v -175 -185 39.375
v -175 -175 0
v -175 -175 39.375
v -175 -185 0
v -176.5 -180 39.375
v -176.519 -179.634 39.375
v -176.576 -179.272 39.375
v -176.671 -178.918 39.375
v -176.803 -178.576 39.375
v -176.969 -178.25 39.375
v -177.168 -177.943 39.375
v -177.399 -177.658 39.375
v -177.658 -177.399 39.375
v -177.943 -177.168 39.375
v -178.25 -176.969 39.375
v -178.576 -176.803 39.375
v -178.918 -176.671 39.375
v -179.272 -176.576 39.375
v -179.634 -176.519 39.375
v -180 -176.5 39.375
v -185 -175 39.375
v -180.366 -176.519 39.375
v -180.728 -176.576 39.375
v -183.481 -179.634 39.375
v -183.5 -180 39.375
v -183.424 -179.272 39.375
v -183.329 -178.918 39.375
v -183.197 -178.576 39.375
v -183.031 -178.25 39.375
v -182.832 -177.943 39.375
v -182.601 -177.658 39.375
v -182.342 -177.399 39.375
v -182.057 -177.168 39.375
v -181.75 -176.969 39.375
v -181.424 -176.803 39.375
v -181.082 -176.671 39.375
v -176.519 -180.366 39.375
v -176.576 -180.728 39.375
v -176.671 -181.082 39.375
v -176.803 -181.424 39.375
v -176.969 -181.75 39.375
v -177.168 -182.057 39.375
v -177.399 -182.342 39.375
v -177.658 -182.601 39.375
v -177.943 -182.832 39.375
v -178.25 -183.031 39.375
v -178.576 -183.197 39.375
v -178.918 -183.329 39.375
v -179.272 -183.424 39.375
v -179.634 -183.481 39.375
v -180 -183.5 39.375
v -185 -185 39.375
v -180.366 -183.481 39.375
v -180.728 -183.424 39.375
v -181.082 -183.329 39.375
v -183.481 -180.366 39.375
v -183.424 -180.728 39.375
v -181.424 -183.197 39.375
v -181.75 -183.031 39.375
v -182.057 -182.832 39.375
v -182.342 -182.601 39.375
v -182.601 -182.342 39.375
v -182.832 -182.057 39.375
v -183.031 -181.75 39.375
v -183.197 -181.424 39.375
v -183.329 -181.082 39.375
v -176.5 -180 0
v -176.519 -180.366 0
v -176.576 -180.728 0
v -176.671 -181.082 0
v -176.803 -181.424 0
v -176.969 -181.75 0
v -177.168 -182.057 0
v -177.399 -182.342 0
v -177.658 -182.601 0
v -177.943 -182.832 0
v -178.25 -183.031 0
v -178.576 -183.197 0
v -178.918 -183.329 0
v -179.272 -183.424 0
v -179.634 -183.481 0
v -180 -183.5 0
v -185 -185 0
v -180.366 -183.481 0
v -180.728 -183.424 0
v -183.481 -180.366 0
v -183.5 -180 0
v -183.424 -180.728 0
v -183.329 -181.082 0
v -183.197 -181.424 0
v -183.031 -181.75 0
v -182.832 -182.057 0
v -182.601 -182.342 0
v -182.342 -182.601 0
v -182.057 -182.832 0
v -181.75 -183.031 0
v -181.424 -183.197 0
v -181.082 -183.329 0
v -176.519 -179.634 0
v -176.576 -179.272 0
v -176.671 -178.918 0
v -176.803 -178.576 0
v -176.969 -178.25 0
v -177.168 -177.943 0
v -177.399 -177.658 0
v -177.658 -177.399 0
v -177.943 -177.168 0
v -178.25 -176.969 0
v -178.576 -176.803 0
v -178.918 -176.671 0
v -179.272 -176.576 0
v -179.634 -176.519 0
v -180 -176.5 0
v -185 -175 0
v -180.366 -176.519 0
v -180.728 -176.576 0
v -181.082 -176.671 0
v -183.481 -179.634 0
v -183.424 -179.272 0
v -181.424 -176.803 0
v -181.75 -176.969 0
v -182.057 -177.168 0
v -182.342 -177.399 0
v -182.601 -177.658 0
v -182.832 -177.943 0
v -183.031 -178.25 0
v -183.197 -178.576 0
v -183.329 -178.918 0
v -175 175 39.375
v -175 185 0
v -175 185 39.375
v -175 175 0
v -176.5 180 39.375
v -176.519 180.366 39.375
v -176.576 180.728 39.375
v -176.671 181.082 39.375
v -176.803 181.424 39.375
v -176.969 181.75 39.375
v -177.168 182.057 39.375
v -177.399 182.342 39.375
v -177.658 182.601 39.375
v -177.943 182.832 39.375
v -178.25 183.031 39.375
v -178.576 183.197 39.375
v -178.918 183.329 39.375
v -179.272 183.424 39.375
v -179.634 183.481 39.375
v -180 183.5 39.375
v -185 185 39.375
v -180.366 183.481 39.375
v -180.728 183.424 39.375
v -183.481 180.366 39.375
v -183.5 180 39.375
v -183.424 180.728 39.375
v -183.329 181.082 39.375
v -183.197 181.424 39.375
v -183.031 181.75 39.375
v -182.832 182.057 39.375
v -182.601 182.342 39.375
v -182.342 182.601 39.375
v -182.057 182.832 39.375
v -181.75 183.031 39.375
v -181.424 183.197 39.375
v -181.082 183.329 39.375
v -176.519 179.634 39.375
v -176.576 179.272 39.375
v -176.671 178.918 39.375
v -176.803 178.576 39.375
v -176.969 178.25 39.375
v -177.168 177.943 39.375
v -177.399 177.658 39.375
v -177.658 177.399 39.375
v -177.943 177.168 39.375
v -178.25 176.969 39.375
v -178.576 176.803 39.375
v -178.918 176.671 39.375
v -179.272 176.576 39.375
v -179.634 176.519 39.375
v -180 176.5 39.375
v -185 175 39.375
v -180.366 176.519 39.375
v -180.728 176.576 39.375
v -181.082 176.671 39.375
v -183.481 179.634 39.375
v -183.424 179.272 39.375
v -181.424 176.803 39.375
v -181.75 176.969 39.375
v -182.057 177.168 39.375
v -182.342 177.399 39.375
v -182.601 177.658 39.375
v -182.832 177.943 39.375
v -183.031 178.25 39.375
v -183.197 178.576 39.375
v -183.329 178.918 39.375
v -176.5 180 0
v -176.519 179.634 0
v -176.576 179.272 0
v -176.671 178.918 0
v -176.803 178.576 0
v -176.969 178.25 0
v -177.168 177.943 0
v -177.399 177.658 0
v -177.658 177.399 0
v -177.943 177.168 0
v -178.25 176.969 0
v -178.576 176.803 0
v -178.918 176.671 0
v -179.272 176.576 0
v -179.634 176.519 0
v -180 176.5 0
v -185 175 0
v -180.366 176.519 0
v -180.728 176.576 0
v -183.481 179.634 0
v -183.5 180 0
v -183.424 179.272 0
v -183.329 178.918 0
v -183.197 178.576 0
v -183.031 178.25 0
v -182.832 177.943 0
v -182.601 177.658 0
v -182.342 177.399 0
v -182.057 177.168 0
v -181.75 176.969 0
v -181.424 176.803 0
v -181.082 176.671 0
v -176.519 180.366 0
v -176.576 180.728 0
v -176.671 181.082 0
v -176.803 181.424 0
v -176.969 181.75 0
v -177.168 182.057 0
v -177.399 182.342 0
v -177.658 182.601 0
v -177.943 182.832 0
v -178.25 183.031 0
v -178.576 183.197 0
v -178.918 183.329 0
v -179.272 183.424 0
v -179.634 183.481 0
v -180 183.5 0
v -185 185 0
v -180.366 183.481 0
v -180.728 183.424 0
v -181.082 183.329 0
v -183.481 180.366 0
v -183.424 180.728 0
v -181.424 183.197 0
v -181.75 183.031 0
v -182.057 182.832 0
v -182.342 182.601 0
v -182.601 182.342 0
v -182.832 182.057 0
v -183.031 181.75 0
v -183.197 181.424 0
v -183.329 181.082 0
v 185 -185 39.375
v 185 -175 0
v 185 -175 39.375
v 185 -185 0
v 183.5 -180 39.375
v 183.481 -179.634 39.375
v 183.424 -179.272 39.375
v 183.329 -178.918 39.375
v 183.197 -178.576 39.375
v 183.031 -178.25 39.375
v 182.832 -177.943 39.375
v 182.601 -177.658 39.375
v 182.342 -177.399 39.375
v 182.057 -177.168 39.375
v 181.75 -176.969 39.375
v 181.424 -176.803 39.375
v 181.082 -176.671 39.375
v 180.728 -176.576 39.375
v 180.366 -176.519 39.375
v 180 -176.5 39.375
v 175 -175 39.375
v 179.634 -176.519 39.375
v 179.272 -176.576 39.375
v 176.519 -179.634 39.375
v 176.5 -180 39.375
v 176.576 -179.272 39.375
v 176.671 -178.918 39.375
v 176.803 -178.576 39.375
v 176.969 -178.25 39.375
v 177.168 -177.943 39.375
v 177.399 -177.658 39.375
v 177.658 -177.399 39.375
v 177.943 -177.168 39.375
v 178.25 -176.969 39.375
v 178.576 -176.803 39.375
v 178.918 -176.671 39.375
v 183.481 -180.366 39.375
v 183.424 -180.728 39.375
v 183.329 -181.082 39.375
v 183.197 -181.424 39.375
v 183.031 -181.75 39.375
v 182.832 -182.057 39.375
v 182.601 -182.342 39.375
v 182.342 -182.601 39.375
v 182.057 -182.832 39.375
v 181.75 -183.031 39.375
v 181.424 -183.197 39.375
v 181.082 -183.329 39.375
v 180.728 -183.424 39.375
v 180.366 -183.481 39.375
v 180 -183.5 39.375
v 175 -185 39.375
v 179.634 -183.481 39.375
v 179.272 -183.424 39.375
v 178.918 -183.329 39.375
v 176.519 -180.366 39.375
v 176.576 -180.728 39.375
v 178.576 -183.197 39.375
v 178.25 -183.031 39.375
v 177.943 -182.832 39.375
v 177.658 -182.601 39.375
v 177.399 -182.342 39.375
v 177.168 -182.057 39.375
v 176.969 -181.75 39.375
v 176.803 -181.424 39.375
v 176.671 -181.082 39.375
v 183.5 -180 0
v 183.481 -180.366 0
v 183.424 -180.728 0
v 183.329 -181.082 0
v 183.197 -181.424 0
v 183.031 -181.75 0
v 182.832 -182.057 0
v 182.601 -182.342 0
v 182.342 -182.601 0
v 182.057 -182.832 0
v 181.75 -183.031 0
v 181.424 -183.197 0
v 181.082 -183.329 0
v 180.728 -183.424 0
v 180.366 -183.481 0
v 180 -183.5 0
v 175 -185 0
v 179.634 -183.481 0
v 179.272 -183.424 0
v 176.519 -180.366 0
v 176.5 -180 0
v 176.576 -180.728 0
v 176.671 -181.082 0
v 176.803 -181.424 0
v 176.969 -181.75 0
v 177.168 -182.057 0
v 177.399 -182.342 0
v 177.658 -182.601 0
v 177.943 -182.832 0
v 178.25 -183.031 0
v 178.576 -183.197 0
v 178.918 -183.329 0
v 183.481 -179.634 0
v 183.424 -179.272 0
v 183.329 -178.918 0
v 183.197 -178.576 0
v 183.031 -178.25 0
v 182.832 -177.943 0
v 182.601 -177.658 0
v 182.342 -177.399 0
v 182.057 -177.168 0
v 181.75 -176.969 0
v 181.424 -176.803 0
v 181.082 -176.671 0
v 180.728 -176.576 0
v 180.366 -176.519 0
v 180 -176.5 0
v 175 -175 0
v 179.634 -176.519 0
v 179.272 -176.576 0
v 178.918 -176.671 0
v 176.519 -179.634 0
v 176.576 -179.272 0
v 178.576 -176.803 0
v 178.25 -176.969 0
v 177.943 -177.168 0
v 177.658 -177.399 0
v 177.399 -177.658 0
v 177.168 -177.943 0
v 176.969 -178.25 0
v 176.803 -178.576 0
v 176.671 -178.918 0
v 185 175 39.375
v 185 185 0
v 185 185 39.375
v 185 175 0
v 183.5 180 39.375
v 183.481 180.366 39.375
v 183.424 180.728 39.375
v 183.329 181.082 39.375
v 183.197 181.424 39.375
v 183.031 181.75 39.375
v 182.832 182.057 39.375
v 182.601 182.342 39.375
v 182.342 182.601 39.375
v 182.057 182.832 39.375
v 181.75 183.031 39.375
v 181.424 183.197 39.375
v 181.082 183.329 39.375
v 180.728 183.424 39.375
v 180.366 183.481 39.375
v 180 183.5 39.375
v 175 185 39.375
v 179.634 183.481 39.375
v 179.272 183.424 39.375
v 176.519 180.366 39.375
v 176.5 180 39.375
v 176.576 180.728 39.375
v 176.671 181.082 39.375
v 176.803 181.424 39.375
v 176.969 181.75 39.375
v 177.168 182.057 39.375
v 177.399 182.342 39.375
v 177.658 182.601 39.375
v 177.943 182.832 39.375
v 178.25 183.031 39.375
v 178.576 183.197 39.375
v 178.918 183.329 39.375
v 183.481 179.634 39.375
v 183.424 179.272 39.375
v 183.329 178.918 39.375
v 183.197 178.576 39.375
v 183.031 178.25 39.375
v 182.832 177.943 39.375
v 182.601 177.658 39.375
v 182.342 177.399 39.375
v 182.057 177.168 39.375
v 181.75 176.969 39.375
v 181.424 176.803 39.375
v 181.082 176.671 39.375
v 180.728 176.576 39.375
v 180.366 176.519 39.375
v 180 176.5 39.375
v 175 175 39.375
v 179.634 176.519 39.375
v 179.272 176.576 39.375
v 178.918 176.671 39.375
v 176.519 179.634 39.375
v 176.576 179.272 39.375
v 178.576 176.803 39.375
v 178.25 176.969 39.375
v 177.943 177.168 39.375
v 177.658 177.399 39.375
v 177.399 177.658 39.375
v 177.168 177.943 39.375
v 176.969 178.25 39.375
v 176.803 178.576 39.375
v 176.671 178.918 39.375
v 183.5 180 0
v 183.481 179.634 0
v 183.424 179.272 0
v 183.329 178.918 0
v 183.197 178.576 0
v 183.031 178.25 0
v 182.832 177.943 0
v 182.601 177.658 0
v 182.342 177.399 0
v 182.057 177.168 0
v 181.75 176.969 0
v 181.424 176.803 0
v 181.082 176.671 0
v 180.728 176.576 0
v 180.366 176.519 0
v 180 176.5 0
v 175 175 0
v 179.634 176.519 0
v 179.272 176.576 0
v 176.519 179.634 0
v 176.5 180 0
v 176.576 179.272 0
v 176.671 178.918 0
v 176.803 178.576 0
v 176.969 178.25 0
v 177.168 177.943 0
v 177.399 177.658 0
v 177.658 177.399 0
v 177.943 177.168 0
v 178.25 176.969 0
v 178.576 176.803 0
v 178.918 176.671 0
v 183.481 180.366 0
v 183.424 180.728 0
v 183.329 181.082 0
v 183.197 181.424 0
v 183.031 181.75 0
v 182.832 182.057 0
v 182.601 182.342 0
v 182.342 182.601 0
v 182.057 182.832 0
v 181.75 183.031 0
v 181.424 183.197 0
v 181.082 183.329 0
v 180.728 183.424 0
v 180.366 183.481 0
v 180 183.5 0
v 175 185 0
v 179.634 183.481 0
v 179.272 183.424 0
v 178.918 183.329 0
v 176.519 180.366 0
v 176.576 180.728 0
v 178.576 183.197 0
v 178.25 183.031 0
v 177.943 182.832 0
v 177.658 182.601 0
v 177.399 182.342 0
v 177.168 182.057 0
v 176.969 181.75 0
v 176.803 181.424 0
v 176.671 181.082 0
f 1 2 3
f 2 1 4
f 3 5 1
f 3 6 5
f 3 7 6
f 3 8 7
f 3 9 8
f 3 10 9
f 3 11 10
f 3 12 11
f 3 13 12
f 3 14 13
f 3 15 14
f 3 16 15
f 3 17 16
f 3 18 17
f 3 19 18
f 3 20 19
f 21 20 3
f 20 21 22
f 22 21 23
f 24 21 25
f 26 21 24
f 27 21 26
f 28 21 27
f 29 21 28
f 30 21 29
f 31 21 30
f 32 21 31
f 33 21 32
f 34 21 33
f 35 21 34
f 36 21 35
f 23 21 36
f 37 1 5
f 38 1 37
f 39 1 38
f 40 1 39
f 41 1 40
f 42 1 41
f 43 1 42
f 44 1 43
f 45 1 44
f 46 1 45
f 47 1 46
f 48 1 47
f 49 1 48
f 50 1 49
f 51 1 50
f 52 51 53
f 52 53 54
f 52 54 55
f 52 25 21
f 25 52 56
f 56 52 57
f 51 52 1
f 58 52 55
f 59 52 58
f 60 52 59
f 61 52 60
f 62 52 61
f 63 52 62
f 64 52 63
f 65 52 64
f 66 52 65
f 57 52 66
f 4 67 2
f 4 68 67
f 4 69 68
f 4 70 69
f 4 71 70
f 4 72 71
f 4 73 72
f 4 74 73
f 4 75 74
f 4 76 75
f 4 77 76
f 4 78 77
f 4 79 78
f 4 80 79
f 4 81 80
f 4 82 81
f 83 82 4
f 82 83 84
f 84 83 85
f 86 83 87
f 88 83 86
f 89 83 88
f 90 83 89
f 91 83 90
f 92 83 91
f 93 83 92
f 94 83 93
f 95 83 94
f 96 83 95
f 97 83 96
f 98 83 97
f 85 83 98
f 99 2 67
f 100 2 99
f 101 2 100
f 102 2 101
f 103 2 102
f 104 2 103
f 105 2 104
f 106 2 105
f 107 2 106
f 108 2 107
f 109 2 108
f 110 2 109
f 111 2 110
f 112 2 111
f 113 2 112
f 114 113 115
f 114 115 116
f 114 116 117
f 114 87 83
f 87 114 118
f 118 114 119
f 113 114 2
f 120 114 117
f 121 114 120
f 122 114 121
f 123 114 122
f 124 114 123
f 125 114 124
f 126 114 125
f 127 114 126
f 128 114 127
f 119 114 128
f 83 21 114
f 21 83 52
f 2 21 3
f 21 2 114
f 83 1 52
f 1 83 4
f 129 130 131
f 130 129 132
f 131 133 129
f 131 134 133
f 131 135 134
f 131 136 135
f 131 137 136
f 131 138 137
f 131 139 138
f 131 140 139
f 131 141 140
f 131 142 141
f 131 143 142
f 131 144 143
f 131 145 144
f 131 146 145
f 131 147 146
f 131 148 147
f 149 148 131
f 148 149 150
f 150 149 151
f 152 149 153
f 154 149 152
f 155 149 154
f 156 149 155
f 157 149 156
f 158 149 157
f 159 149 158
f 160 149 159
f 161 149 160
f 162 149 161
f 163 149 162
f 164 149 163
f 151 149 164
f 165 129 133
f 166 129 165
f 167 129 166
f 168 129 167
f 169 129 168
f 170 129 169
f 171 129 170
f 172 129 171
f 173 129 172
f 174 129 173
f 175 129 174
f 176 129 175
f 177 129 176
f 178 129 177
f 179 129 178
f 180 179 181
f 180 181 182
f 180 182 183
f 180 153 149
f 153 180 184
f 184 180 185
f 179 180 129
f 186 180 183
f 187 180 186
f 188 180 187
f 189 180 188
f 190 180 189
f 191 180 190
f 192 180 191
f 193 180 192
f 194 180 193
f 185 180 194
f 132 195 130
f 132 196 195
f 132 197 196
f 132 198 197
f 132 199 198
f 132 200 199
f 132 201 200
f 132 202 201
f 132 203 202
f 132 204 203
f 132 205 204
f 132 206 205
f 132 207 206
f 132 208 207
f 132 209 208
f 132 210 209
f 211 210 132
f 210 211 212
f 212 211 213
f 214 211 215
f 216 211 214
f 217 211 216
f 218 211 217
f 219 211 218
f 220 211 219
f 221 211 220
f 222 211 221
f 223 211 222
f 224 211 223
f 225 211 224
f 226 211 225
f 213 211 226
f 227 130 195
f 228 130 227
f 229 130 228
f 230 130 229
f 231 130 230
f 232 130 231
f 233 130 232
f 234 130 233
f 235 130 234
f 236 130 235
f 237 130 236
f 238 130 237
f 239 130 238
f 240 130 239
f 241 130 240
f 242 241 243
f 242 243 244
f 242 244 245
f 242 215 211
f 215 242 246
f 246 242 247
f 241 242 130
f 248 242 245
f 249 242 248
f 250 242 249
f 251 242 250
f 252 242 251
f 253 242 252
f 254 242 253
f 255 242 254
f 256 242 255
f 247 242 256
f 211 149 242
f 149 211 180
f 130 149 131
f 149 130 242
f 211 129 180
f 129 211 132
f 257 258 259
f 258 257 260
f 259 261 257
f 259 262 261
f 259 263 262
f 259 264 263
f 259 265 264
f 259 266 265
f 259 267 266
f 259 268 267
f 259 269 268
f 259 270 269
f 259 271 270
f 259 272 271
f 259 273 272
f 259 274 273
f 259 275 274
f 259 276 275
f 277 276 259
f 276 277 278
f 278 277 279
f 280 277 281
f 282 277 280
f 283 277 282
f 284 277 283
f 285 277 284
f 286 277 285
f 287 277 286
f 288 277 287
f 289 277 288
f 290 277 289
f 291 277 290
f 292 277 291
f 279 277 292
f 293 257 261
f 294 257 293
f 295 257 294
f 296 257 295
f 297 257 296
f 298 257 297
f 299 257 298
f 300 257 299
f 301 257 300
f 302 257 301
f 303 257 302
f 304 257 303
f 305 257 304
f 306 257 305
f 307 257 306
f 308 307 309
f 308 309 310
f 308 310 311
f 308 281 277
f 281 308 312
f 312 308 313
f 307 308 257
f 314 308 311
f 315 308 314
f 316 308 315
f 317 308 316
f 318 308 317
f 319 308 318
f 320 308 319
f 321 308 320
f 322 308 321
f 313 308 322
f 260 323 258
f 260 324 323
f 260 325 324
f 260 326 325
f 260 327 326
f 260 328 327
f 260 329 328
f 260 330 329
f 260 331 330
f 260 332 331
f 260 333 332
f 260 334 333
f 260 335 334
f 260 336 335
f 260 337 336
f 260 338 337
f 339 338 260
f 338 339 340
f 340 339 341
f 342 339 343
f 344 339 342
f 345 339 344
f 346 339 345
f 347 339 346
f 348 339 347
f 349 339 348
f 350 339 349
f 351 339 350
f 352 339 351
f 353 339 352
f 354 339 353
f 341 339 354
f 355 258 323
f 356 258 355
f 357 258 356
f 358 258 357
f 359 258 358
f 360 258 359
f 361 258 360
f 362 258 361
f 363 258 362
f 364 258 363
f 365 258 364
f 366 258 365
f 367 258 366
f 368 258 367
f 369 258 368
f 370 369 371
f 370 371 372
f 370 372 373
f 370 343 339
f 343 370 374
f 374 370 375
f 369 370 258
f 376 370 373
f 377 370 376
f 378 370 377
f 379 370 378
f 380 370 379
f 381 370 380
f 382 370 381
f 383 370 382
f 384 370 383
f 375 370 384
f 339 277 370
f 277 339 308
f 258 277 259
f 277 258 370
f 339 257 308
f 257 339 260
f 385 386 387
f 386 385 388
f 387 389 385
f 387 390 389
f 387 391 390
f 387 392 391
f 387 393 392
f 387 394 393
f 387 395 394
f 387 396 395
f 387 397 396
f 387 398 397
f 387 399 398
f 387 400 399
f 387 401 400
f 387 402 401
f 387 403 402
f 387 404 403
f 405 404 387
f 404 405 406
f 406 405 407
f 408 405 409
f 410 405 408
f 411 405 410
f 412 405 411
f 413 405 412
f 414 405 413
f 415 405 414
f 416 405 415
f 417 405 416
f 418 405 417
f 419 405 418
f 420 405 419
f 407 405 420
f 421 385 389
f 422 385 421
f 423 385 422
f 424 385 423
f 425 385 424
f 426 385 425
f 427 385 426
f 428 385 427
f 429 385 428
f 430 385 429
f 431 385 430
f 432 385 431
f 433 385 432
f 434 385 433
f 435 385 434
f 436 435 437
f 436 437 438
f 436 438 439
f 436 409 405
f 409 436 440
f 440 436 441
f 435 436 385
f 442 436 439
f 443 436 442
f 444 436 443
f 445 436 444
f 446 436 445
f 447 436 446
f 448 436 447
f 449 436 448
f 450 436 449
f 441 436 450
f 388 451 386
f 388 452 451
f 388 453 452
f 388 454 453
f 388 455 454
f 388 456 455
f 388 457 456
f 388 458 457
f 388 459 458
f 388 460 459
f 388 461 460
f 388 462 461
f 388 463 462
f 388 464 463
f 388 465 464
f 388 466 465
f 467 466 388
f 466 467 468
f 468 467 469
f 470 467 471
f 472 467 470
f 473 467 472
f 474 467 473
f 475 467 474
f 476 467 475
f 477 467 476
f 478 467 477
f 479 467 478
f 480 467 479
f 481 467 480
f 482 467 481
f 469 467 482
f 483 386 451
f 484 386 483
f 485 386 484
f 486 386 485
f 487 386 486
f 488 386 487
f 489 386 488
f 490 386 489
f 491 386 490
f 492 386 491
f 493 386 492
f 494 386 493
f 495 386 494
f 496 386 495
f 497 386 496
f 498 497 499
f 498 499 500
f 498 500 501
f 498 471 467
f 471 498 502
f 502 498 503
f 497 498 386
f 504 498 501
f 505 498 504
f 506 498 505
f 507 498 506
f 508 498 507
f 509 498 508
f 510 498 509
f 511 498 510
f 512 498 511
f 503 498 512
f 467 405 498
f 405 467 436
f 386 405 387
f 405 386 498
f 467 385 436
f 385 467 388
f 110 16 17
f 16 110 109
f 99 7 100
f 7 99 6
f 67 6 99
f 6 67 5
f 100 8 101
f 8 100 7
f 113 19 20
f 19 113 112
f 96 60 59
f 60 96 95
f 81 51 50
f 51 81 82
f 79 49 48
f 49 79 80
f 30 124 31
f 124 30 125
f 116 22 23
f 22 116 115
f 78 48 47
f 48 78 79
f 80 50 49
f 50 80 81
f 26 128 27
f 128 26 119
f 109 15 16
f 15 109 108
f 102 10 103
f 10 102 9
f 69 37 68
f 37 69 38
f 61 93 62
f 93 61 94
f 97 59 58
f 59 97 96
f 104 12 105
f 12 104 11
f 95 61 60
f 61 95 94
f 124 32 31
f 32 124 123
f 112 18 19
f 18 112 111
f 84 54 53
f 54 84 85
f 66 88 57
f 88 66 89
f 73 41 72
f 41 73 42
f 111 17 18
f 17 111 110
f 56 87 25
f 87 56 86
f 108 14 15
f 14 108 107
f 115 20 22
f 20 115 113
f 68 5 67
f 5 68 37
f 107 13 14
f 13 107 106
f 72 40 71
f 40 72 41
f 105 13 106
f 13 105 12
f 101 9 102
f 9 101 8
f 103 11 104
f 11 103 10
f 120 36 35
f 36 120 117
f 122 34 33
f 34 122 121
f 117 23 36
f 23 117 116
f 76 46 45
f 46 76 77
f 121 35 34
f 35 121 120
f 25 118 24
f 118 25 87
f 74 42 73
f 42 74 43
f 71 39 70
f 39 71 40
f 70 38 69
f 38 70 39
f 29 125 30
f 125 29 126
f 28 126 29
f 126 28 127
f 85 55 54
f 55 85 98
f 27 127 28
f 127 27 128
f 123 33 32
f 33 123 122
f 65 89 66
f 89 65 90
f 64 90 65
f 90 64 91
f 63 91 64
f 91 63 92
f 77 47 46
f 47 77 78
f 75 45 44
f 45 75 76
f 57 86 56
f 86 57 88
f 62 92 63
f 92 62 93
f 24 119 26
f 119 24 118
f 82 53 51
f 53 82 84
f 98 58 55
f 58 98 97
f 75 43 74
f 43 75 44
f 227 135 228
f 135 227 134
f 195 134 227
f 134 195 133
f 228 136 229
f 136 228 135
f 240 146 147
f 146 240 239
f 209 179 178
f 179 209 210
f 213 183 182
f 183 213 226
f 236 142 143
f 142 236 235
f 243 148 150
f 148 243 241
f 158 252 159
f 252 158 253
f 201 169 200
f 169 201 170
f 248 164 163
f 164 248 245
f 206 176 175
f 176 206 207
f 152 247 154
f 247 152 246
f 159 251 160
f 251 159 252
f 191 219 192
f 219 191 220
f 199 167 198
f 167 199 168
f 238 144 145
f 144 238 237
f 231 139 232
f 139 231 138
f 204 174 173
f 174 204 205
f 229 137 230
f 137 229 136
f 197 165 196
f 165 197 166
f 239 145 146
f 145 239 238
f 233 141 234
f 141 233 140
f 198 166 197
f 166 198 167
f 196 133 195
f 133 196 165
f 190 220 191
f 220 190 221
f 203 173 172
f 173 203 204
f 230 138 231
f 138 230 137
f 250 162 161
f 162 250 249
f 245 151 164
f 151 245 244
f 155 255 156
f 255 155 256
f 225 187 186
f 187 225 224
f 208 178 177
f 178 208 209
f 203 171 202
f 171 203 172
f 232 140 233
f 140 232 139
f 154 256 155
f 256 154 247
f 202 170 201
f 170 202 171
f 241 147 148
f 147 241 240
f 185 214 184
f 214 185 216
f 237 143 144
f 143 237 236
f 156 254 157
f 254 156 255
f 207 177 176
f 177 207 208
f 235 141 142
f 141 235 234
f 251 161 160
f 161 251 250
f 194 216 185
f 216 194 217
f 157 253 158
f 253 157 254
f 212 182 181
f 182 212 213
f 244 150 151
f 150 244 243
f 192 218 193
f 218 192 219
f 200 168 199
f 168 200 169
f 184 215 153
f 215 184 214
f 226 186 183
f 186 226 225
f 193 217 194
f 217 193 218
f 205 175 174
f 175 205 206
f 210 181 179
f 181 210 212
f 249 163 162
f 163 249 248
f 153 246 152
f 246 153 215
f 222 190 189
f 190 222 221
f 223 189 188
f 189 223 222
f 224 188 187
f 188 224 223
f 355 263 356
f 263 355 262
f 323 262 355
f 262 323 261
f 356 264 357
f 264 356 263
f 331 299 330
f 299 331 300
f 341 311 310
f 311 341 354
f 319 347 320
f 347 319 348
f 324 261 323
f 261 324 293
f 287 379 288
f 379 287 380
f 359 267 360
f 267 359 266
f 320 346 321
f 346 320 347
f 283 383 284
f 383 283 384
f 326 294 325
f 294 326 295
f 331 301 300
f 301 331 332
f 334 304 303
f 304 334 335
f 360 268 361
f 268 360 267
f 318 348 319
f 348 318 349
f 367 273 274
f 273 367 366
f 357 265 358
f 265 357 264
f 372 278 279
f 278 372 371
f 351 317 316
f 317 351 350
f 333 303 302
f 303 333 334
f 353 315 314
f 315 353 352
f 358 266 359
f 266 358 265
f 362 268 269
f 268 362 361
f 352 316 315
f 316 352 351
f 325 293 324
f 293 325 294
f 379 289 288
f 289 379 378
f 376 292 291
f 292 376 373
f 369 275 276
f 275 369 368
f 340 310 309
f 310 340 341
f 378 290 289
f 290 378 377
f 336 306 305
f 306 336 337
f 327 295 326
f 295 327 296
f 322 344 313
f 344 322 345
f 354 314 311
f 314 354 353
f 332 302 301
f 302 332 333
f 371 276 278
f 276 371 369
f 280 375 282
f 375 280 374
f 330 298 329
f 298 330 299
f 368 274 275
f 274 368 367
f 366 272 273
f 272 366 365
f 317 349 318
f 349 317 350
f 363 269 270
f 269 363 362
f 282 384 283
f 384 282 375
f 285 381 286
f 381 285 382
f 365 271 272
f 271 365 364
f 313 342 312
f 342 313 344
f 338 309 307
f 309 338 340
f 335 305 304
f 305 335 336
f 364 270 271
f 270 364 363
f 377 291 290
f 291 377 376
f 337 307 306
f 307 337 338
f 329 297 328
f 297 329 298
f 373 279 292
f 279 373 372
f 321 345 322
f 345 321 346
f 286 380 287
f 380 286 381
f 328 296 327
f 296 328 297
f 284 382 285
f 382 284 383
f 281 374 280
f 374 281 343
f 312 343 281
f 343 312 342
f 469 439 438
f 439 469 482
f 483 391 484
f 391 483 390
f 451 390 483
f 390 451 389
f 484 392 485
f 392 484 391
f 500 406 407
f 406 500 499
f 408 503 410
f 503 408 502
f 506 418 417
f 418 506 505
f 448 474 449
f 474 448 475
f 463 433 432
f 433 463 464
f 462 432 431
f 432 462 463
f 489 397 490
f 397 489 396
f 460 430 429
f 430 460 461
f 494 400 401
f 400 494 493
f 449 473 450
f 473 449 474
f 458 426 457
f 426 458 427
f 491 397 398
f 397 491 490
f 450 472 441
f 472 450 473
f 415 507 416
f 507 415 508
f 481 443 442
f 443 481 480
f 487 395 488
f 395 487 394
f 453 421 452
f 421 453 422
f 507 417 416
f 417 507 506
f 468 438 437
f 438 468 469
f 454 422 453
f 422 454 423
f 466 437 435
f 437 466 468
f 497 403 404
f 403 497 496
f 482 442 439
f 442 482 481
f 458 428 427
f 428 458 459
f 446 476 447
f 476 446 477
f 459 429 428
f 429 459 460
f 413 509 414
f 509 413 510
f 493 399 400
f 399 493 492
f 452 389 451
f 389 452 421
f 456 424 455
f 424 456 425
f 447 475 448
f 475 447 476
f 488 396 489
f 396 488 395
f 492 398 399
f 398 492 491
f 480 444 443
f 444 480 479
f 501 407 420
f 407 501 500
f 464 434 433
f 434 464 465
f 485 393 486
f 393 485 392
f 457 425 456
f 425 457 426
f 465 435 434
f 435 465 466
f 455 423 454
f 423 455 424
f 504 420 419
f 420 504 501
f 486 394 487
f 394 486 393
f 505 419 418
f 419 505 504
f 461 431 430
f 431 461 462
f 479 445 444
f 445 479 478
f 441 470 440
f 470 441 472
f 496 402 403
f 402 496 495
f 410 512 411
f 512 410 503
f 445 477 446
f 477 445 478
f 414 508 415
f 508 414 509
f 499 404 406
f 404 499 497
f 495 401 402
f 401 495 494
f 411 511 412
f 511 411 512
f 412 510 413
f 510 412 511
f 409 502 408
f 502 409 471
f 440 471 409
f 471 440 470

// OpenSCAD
$fn=60;
module spacer_layer() {
    h = 39.375;
    difference() {
        union() {
            for (x = [-180, 180]) for (y = [-180, 180]) translate([x - 5, y - 5, 0]) cube([10, 10, h]);
        }
        for (x = [-180, 180]) for (y = [-180, 180]) translate([x, y, -1]) cylinder(d=7, h=h + 2);
    }
}
spacer_layer();
